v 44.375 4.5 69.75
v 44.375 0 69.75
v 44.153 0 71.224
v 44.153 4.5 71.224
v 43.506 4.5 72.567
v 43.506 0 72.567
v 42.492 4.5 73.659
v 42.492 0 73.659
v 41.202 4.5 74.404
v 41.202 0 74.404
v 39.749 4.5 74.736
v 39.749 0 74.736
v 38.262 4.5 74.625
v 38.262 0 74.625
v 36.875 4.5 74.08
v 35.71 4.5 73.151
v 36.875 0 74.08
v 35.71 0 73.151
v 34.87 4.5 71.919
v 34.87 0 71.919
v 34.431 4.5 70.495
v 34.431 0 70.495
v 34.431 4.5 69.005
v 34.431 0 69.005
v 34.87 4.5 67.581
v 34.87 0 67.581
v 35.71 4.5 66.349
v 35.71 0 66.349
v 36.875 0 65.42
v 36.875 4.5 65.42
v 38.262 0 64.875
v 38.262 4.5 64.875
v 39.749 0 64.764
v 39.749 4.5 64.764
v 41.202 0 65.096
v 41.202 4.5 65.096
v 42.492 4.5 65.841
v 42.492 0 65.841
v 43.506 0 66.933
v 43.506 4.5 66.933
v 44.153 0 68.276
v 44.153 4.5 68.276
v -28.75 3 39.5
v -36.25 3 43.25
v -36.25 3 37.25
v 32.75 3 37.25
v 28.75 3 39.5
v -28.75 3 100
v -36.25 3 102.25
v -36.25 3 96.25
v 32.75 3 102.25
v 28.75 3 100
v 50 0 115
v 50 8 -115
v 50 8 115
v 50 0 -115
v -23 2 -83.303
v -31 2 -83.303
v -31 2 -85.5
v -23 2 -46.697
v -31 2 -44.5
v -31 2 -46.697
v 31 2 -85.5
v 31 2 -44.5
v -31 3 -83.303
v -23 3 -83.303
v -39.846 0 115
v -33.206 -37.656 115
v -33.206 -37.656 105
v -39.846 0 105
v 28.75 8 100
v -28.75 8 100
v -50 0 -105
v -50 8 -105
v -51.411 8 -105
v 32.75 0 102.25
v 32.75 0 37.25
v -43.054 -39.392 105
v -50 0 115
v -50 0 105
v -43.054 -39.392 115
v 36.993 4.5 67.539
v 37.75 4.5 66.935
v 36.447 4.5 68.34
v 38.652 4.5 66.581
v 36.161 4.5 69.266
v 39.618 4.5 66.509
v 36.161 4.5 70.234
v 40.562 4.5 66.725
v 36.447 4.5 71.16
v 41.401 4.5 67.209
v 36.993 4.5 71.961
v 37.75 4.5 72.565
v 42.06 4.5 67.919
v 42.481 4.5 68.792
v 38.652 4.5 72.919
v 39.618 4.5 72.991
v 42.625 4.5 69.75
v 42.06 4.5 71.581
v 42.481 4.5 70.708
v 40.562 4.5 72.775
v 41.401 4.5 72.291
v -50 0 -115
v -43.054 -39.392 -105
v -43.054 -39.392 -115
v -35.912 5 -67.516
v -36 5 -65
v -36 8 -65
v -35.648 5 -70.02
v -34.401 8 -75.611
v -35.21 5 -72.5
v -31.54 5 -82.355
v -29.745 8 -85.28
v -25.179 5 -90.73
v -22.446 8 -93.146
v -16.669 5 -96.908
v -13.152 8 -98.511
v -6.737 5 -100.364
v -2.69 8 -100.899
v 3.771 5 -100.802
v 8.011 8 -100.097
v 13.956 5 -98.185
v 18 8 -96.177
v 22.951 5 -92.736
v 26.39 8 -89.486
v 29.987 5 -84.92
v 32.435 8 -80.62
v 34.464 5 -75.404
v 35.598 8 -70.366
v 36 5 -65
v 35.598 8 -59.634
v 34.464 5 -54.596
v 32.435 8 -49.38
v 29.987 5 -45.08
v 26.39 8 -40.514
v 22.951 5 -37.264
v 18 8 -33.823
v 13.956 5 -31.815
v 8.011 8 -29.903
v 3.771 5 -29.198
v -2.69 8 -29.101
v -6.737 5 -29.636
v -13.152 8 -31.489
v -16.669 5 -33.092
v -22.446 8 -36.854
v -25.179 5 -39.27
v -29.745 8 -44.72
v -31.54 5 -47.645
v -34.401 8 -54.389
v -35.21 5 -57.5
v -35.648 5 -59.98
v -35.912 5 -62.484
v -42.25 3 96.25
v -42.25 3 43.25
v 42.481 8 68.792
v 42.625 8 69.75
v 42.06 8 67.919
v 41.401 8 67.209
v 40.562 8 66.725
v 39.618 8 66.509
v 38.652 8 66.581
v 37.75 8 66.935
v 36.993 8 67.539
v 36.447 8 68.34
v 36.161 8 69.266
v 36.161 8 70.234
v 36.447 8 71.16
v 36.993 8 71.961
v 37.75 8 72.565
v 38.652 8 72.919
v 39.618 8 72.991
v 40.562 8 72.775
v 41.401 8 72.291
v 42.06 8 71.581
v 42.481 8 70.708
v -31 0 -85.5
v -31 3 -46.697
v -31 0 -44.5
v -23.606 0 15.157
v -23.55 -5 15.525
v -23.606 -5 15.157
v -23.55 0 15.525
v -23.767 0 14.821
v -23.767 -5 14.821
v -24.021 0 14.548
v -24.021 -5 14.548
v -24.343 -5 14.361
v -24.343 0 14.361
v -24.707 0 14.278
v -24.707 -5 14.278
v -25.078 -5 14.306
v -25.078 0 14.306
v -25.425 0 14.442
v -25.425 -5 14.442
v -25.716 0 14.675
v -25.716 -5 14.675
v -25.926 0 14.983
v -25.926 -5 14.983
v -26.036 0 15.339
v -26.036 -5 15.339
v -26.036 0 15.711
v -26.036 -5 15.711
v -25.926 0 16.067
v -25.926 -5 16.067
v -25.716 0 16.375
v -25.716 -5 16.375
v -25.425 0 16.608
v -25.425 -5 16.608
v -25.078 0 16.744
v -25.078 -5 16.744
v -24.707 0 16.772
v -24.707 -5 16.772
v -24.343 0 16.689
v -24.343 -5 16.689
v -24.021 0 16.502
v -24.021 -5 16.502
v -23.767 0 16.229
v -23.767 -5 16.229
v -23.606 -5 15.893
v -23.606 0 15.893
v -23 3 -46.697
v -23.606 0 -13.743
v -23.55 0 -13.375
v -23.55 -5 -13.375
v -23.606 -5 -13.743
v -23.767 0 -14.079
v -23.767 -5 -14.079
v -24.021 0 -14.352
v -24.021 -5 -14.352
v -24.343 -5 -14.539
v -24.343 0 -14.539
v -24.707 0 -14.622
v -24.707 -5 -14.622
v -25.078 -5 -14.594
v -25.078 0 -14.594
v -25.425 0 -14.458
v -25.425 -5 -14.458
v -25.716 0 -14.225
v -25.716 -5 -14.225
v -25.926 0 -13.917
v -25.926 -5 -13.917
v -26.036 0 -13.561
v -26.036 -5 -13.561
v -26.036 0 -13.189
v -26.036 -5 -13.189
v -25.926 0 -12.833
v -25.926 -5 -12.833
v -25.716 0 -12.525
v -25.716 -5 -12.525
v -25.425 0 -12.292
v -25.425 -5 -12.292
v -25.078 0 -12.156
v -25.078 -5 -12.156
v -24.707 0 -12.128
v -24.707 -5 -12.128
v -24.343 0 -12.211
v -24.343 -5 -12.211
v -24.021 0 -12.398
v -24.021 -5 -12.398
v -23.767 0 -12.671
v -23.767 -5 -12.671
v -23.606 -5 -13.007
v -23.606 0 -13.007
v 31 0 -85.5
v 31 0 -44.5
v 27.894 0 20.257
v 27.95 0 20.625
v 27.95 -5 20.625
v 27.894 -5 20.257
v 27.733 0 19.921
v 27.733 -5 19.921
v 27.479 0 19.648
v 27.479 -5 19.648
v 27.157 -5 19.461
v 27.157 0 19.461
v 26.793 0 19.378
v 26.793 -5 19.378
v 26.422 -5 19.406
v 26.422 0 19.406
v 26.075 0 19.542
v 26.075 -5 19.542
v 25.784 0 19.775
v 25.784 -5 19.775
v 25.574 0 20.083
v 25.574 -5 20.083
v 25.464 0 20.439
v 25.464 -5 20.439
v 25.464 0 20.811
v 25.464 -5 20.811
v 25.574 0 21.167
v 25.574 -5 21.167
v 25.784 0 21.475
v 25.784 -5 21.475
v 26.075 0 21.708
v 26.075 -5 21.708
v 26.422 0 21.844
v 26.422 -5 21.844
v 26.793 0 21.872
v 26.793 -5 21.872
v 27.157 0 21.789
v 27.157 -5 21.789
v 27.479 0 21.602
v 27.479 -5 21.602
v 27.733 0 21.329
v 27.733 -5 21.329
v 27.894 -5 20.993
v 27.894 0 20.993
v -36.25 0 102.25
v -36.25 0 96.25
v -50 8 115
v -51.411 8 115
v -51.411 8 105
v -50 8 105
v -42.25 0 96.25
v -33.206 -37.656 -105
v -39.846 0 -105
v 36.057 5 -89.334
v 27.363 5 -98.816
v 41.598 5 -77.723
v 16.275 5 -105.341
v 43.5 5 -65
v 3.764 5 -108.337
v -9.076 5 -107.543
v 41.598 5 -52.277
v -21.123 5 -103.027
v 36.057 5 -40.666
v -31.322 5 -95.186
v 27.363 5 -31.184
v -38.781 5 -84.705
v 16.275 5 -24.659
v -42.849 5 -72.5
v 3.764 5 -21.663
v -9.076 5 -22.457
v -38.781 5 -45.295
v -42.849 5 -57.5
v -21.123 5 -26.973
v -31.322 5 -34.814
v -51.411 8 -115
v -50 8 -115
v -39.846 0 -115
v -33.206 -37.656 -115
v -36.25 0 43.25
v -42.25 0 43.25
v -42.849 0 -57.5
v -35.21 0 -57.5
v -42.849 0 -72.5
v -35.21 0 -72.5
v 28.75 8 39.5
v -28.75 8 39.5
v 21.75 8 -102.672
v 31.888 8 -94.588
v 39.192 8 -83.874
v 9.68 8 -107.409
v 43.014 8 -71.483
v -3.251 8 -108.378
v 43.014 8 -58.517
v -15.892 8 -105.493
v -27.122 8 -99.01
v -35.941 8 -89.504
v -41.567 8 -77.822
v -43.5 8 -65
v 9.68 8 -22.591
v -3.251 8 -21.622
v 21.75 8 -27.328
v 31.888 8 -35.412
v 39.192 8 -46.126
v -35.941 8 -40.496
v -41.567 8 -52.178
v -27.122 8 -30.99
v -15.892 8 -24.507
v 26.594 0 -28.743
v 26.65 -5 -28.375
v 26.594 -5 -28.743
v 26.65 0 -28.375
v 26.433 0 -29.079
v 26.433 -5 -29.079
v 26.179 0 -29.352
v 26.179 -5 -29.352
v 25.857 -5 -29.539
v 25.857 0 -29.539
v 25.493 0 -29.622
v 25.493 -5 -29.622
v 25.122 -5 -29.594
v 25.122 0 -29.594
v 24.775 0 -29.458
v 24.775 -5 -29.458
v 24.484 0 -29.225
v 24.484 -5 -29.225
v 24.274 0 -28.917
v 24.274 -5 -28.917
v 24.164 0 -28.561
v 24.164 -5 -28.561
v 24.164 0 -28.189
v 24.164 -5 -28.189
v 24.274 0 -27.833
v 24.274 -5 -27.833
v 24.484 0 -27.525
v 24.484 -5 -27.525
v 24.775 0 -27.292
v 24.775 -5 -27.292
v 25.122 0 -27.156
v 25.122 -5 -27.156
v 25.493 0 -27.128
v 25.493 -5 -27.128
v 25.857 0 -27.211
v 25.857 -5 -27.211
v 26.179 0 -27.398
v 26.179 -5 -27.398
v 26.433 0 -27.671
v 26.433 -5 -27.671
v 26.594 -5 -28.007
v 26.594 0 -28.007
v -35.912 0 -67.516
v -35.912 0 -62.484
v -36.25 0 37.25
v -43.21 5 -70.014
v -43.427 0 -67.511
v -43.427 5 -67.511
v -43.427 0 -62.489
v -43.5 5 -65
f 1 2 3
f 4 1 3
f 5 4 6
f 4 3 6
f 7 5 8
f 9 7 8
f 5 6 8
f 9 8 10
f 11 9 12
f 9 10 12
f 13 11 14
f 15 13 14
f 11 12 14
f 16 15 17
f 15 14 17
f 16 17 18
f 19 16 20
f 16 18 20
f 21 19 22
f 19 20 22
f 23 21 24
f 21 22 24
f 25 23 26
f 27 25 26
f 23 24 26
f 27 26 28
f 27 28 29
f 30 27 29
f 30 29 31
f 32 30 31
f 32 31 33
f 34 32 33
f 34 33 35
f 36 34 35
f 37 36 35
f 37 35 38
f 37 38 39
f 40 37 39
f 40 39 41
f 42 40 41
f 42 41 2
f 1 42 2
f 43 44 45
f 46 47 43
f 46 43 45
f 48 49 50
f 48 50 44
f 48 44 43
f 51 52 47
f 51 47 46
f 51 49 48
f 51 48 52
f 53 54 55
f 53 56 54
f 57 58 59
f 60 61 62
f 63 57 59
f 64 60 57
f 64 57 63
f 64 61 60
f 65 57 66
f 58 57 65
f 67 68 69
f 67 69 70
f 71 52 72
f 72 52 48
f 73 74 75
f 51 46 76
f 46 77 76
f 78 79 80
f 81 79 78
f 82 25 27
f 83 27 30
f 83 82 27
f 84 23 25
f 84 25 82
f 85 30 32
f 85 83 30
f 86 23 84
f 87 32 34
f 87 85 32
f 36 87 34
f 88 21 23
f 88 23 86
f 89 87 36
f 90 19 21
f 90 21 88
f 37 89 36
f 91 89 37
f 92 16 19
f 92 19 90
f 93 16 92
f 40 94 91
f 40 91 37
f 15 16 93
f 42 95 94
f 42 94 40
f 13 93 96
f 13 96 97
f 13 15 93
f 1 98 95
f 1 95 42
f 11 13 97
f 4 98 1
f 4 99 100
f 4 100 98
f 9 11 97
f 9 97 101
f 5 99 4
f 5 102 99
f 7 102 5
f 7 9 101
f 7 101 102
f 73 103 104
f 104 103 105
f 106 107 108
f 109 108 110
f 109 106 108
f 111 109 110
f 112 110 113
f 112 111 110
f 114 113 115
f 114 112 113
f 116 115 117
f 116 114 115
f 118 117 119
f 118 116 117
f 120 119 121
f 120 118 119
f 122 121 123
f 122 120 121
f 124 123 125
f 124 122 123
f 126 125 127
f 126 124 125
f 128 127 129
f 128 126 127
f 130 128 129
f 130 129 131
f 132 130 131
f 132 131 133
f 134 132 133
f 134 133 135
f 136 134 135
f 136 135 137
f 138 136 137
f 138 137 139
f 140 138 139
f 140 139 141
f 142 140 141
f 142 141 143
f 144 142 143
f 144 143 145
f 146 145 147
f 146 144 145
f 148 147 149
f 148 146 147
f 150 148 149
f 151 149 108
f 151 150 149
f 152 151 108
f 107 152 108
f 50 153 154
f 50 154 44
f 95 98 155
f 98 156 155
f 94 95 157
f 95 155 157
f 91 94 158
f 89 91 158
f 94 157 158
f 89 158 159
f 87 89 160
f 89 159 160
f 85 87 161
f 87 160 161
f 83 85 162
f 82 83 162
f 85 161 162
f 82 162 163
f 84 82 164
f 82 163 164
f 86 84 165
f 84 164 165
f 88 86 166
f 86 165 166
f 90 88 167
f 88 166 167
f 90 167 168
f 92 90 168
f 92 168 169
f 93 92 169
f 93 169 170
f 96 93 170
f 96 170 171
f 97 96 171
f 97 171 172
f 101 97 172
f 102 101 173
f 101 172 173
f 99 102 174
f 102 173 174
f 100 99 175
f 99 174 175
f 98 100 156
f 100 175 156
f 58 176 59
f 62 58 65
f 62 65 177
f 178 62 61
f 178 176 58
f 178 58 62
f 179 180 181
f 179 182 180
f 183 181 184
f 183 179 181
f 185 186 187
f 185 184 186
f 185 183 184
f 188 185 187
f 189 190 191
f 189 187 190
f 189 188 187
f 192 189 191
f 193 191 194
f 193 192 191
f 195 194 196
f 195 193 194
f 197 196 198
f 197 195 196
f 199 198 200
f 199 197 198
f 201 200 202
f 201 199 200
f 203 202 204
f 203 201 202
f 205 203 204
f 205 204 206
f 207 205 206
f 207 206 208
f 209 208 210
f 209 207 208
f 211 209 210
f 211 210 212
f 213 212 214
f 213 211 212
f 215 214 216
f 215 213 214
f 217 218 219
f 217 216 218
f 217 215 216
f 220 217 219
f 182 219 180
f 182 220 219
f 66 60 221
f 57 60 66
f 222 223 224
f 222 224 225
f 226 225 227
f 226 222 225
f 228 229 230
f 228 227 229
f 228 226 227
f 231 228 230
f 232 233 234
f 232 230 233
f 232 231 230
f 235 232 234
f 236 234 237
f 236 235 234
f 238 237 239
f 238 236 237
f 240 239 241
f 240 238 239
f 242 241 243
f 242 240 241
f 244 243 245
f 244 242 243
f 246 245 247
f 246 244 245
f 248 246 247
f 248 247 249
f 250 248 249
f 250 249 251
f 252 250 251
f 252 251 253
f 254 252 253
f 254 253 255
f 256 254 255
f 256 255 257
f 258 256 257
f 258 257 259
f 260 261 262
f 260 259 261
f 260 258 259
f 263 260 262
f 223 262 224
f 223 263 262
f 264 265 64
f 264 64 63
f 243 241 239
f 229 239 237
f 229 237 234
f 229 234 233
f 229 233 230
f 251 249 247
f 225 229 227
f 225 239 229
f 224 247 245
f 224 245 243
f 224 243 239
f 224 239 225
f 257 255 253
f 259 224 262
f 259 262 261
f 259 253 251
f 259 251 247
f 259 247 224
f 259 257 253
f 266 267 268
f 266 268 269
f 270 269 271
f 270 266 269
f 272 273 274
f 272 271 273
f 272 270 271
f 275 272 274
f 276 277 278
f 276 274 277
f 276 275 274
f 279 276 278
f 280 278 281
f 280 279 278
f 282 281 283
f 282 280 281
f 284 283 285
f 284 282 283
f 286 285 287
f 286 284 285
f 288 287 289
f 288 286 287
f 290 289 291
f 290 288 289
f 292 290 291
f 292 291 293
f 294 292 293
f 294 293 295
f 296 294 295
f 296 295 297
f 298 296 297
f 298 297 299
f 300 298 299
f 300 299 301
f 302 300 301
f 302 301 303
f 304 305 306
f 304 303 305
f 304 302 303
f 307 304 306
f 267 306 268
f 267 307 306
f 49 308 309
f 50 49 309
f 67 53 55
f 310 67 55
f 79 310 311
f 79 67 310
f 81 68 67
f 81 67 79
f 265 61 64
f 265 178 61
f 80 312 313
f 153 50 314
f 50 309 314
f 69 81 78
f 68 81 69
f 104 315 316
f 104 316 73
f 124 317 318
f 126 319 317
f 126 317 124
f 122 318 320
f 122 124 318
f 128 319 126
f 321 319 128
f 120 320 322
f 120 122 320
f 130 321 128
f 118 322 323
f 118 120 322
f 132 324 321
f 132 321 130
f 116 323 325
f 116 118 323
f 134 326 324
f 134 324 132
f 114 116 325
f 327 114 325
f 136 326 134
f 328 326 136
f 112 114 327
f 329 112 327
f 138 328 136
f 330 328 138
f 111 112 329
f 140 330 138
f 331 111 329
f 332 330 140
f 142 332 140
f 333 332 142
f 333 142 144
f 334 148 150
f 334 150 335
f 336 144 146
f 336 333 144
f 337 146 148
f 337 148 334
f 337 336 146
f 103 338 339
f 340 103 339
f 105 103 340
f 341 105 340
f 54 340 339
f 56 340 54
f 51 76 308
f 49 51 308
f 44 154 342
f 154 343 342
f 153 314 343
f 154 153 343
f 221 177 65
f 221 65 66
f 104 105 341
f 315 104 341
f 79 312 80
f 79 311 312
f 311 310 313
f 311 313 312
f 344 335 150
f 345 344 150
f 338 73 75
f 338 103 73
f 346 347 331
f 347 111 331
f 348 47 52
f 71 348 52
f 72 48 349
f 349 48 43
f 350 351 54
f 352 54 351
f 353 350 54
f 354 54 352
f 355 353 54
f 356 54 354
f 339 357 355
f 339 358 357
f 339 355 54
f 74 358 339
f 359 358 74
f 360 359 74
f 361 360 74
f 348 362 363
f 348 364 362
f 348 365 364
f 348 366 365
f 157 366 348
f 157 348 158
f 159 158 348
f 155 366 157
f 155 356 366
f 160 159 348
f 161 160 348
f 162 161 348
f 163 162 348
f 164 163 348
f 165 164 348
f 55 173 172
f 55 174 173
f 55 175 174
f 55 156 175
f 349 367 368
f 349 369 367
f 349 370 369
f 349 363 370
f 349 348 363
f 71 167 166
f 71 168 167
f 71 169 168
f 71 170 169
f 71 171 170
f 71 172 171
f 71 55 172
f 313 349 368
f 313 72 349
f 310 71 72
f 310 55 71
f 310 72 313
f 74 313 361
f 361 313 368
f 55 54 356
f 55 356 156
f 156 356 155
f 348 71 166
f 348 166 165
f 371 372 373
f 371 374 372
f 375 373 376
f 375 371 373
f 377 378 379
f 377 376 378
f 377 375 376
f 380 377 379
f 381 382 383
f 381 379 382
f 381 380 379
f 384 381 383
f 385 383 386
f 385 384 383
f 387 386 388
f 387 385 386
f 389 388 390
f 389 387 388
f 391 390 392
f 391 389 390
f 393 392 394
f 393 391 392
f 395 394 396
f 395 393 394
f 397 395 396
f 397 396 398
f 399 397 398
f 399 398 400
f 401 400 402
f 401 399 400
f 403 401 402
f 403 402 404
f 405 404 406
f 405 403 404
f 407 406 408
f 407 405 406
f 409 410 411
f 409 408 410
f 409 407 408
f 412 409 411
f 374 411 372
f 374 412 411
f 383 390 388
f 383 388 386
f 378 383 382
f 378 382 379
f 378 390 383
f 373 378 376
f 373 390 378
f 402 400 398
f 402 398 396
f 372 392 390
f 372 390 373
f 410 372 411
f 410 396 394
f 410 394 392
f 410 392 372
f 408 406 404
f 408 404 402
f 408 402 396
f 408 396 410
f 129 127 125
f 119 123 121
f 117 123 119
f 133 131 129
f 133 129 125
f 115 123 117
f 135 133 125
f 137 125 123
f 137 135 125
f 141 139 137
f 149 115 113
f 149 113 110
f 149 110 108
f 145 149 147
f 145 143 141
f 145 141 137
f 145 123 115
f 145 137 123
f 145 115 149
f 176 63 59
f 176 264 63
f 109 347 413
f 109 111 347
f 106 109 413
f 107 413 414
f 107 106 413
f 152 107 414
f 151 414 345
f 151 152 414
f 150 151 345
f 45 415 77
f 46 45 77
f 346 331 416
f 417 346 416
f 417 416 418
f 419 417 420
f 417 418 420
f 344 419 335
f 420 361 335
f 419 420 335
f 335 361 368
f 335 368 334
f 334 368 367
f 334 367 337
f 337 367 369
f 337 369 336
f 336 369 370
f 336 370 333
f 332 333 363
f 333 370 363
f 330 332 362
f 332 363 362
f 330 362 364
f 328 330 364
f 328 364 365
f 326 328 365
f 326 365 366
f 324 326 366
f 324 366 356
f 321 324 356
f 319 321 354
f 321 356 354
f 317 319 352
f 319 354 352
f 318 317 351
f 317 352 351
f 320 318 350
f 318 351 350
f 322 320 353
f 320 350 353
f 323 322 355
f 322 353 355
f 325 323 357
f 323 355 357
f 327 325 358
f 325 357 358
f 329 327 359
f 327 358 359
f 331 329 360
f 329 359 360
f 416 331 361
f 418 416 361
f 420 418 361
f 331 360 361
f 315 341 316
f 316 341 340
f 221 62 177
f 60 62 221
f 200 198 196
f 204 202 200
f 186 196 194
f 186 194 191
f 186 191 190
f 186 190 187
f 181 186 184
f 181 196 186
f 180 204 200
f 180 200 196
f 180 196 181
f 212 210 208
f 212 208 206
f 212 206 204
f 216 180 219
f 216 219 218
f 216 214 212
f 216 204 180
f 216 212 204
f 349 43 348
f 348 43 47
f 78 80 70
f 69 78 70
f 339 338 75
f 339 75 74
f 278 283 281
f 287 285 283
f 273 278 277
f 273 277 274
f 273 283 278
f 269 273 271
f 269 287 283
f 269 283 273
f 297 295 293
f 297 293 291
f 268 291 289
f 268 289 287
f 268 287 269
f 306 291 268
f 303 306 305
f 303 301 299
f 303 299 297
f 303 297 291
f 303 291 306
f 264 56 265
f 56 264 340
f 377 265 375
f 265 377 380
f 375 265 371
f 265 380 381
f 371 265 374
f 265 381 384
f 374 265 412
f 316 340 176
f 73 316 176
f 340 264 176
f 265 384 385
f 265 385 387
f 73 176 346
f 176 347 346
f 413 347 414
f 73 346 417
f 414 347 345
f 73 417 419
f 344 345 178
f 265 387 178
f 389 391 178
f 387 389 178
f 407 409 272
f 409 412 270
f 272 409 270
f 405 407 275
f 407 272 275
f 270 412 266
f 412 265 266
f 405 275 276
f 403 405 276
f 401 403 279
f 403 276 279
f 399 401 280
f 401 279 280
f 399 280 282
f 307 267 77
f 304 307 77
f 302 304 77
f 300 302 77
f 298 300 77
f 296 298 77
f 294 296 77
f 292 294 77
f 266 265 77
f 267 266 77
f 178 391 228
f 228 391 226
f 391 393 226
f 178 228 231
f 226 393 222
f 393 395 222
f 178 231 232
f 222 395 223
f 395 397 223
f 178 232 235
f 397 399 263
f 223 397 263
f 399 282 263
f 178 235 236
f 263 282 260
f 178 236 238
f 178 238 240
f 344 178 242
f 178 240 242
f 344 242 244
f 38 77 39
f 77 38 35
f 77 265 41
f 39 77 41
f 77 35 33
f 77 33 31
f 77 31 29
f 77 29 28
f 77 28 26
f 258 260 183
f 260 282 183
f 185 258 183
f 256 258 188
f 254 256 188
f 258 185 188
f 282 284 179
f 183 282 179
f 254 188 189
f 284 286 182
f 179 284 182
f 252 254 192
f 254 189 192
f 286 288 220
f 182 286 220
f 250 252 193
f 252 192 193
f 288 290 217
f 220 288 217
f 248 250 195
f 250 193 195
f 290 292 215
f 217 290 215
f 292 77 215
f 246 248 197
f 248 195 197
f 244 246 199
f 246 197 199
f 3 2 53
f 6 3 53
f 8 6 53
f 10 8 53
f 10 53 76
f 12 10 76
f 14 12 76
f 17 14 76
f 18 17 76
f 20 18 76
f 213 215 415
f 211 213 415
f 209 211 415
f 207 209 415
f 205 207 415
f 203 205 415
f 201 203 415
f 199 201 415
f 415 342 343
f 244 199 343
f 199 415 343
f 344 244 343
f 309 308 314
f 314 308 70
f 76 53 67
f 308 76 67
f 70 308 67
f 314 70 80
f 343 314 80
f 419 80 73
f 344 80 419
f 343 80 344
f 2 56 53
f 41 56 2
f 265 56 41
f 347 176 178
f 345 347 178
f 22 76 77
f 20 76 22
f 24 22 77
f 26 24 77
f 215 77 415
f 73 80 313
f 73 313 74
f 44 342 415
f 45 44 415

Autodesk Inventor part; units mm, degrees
ref_plane "YZ Plane" through (0, 0, 0) normal (1, 0, 0) x (0, 1, 0)
ref_plane "XZ Plane" through (0, 0, 0) normal (0, 1, 0) x (-1, 0, 0)
ref_plane "XY Plane" through (0, 0, 0) normal (0, 0, 1) x (1, 0, 0)
sketch "Sketch1" plane through (0, 0, 0) normal (0, 1, 0) x (-1, 0, 0)
  line L0 (-50, 115) -> (50, 115)
  line L1 (50, 115) -> (50, -115)
  line L2 (50, -115) -> (-50, -115)
  line L3 (-50, -115) -> (-50, 115)
  line L4 (-50, 115) -> (50, -115) construction
  line L5 (50, 115) -> (-50, -115) construction
  circle A0 centre (0, -65) radius 43.5
  circle A1 centre (0, -65) radius 36
  line L6 (-28.75, 100) -> (28.75, 100)
  line L7 (28.75, 100) -> (28.75, 39.5)
  line L8 (28.75, 39.5) -> (-28.75, 39.5)
  line L9 (-28.75, 39.5) -> (-28.75, 100)
  line L10 (-28.75, 100) -> (28.75, 39.5) construction
  line L11 (28.75, 100) -> (-28.75, 39.5) construction
  point P0 (0, 0)
  point P1 (0, 69.75)
  dimension "d0" = 7.5
  dimension "d1" = 72
  dimension "d2" = 60.5
  dimension "d3" = 57.5
  dimension "d4" = 100
  dimension "d5" = 230
  dimension "d6" = 15
  dimension "d7" = 50
extrude "Extrusion1" add sketch "Sketch1" along normal blind 8
extrude "Extrusion2" add sketch "Sketch1" along normal blind 5 contours A0
sketch "Sketch2" plane through (0, 0, 0) normal (0, -1, 0) x (1, 0, 0)
  line L0 (50, -115) -> (-50, -115) projected
  line L1 (50, 115) -> (50, -115) projected
  line L2 (-50, 115) -> (50, 115) projected
  line L3 (-50, -115) -> (-50, 115) projected
  line L4 (28.75, 100) -> (-28.75, 100) projected
  line L5 (28.75, 39.5) -> (28.75, 100) projected
  line L6 (-28.75, 39.5) -> (28.75, 39.5) projected
  line L7 (-28.75, 100) -> (-28.75, 39.5) projected
  line L8 (-36.25, 37.25) -> (32.75, 37.25)
  line L9 (32.75, 37.25) -> (32.75, 102.25)
  line L10 (32.75, 102.25) -> (-36.25, 102.25)
  line L11 (-36.25, 102.25) -> (-36.25, 37.25)
  line L12 (-36.25, 37.25) -> (32.75, 102.25) construction
  line L13 (32.75, 37.25) -> (-36.25, 102.25) construction
  point P0 (0, 0)
  point P1 (-1.75, 69.75)
  dimension "d12" = 69
  dimension "d13" = 65
  dimension "d14" = 4
  dimension "d15" = 2.25
extrude "Extrusion3" cut sketch "Sketch2" against normal blind 3 contours L11 L10 L9 L8
sketch "Sketch3" plane through (0, 5, -65) normal (0, 1, 0) x (1, 0, 0)
  circle A0 centre (0, 0) radius 36 projected
  circle A1 centre (0, 0) radius 43.5 projected
  circle A2 centre (0, 0) radius 43.5 projected
  circle A3 centre (0, 0) radius 36 projected
  circle A4 centre (0, 0) radius 36 projected
  line L0 (50, 50) -> (-50, 50) projected
  line L1 (-50, 50) -> (-50, -180) projected
  line L2 (-50, -180) -> (50, -180) projected
  line L3 (50, -180) -> (50, 50) projected
  line L4 (28.75, -165) -> (-28.75, -165) projected
  line L5 (-28.75, -165) -> (-28.75, -104.5) projected
  line L6 (-28.75, -104.5) -> (28.75, -104.5) projected
  line L7 (28.75, -104.5) -> (28.75, -165) projected
  circle A5 centre (0, 0) radius 43.5 projected
  line L8 (-35.2101, 7.5) -> (-42.8486, 7.5)
  line L9 (-42.8486, -7.5) -> (-35.2101, -7.5)
  point P0 (0, -65)
  point P1 (-39.0293, -7.5)
  point P2 (-35.2101, 7.5)
  point P3 (-42.8486, 7.5)
  dimension "d18" = 15
extrude "Extrusion4" cut sketch "Sketch3" against normal through all contours A0 L9 A1 L8 picked at (-37.9902, -5.8388)
sketch "Sketch4" plane through (0, 0, 0) normal (0, -1, 0) x (1, 0, 0)
  arc A0 (-35.2101, -72.5) -> (-35.2101, -57.5) centre (0, -65) ccw projected
  arc A1 (-42.8486, -72.5) -> (-42.8486, -57.5) centre (0, -65) ccw projected
  line L0 (-31, -44.5) -> (31, -44.5)
  line L1 (31, -44.5) -> (31, -85.5)
  line L2 (31, -85.5) -> (-31, -85.5)
  line L3 (-31, -85.5) -> (-31, -44.5)
  line L4 (-31, -44.5) -> (31, -85.5) construction
  line L5 (31, -44.5) -> (-31, -85.5) construction
  point P0 (0, 0)
  point P1 (-31, -46.697)
  point P2 (-31, -83.303)
  point P3 (-29.5931, -85.5)
  point P4 (29.5931, -85.5)
  point P5 (31, -83.303)
  point P6 (31, -46.697)
  point P7 (29.5931, -44.5)
  point P8 (-29.5931, -44.5)
  dimension "d21" = 41
  dimension "d22" = 62
extrude "Extrusion5" cut sketch "Sketch4" against normal blind 2 contours L3 A0 L0 L1 L2 | A0 L2 L3 | L3 L0 A0 | A0 L1 L2 | L0 L1 A0
sketch "Sketch5" plane through (0, 2, 0) normal (0, -1, 0) x (1, 0, 0)
  line L0 (-31, -85.5) -> (-31, -44.5) projected
  line L1 (-31, -46.697) -> (-23, -46.697)
  line L2 (-23, -46.697) -> (-23, -83.303)
  line L3 (-23, -83.303) -> (-31, -83.303)
  line L4 (-31, -83.303) -> (-31, -46.697)
  point P0 (0, 0)
  point P1 (-27, -83.303)
  dimension "d25" = 8
extrude "Extrusion6" cut sketch "Sketch5" against normal blind 1
sketch "Sketch6" plane through (0, 0, 0) normal (0, -1, 0) x (1, 0, 0)
  circle A0 centre (25.4, -28.375) radius 1.25
  circle A1 centre (26.7, 20.625) radius 1.25
  circle A2 centre (-24.8, 15.525) radius 1.25
  circle A3 centre (-24.8, -13.375) radius 1.25
  line L0 (-31, -44.5) -> (31, -44.5) projected
  line L1 (32.75, 37.25) -> (-36.25, 37.25) projected
  point P0 (0, 0)
  point P1 (25.4, -3.625)
  point P2 (-29.5931, -44.5)
  point P3 (29.5931, -44.5)
  dimension "d28" = 2.5
  dimension "d29" = 2.5
  dimension "d30" = 2.5
  dimension "d31" = 2.5
  dimension "d32" = -28.9
  dimension "d33" = -1.3
  dimension "d34" = -51.5
  dimension "d35" = -49
  dimension "d36" = -5.1
  dimension "d37" = -24.75
  dimension "d38" = 81.75
  dimension "d64" = 40.875
extrude "Extrusion7" add sketch "Sketch6" along normal blind 5
sketch "Sketch7" plane through (0, 0, 0) normal (0, -1, 0) x (1, 0, 0)
  line L0 (-36.25, 37.25) -> (-36.25, 102.25) projected
  line L1 (-36.25, 96.25) -> (-42.25, 96.25)
  line L2 (-42.25, 96.25) -> (-42.25, 43.25)
  line L3 (-42.25, 43.25) -> (-36.25, 43.25)
  line L4 (-36.25, 43.25) -> (-36.25, 96.25)
  line L5 (-36.25, 102.25) -> (32.75, 102.25) projected
  line L6 (32.75, 37.25) -> (-36.25, 37.25) projected
  point P0 (0, 0)
  point P1 (-39.25, 96.25)
  point P2 (-39.25, 43.25)
  dimension "d43" = 6
  dimension "d44" = 6
  dimension "d45" = 6
extrude "Extrusion8" cut sketch "Sketch7" against normal up to surface (3 mm away)
sketch "Sketch8" plane through (50, 0, -115) normal (0, 0, -1) x (-1, 0, 0)
  line L0 (0, 0) -> (100, 0) projected
  line L1 (100, 0) -> (100, 8)
  line L2 (100, 0) -> (93.0541, -39.3923)
  line L3 (93.0541, -39.3923) -> (83.206, -37.6558)
  line L4 (83.206, -37.6558) -> (89.8457, 0)
  line L5 (100, 0) -> (101.4106, 8)
  line L6 (101.4106, 8) -> (100, 8)
  point P0 (50, 0)
  dimension "d65" = 10
  dimension "d66" = 80
  dimension "d67" = 170
  dimension "d68" = 48.1234
  dimension "d69" = 40
  dimension "d70" = 80
  dimension "d71" = 38.2367
extrude "Extrusion9" add sketch "Sketch8" against normal blind 10
sketch "Sketch9" plane through (-50, 0, 115) normal (0, 0, 1) x (1, 0, 0)
  line L0 (0, 0) -> (10.1543, 0) projected
  line L1 (101.4106, 8) -> (100, 8) projected
  line L2 (100, 0) -> (100, 8) projected
  line L3 (100, 0) -> (101.4106, 8) projected
  line L4 (0, 0) -> (6.9459, -39.3923) projected
  line L5 (6.9459, -39.3923) -> (16.794, -37.6558) projected
  line L6 (16.794, -37.6558) -> (10.1543, 0) projected
  line L7 (0, 8) -> (-1.4106, 8) projected
  line L8 (-1.4106, 8) -> (0, 0) projected
  line L9 (0, 8) -> (0, 0) projected
  point P0 (50, 0)
extrude "Extrusion10" add sketch "Sketch9" against normal blind 10 contours L0 L6 L5 L4 | L8 L7 L9
sketch "Sketch10" plane through (0, 8, 0) normal (0, 1, 0) x (1, 0, 0)
  circle A0 centre (39.375, -69.75) radius 3.25
  line L0 (28.75, -39.5) -> (28.75, -100) projected
  line L1 (50, -115) -> (50, 115) projected
  point P0 (0, 0)
  point P1 (28.75, -69.75)
  point P2 (50, -105)
  point P3 (50, 105)
  dimension "d56" = 6.5
  dimension "d57" = 21.25
  dimension "d58" = 10.625
extrude "Extrusion11" cut sketch "Sketch10" against normal through all
sketch "Sketch11" plane through (0, 0, 0) normal (0, -1, 0) x (1, 0, 0)
  circle A0 centre (39.375, 69.75) radius 3.25 projected
  circle A1 centre (39.375, 69.75) radius 5
  point P0 (0, 0)
  dimension "d61" = 10
extrude "Extrusion12" cut sketch "Sketch11" against normal blind 4.5 contours A0 | A1
properties part number "ViesCooleHouder"
